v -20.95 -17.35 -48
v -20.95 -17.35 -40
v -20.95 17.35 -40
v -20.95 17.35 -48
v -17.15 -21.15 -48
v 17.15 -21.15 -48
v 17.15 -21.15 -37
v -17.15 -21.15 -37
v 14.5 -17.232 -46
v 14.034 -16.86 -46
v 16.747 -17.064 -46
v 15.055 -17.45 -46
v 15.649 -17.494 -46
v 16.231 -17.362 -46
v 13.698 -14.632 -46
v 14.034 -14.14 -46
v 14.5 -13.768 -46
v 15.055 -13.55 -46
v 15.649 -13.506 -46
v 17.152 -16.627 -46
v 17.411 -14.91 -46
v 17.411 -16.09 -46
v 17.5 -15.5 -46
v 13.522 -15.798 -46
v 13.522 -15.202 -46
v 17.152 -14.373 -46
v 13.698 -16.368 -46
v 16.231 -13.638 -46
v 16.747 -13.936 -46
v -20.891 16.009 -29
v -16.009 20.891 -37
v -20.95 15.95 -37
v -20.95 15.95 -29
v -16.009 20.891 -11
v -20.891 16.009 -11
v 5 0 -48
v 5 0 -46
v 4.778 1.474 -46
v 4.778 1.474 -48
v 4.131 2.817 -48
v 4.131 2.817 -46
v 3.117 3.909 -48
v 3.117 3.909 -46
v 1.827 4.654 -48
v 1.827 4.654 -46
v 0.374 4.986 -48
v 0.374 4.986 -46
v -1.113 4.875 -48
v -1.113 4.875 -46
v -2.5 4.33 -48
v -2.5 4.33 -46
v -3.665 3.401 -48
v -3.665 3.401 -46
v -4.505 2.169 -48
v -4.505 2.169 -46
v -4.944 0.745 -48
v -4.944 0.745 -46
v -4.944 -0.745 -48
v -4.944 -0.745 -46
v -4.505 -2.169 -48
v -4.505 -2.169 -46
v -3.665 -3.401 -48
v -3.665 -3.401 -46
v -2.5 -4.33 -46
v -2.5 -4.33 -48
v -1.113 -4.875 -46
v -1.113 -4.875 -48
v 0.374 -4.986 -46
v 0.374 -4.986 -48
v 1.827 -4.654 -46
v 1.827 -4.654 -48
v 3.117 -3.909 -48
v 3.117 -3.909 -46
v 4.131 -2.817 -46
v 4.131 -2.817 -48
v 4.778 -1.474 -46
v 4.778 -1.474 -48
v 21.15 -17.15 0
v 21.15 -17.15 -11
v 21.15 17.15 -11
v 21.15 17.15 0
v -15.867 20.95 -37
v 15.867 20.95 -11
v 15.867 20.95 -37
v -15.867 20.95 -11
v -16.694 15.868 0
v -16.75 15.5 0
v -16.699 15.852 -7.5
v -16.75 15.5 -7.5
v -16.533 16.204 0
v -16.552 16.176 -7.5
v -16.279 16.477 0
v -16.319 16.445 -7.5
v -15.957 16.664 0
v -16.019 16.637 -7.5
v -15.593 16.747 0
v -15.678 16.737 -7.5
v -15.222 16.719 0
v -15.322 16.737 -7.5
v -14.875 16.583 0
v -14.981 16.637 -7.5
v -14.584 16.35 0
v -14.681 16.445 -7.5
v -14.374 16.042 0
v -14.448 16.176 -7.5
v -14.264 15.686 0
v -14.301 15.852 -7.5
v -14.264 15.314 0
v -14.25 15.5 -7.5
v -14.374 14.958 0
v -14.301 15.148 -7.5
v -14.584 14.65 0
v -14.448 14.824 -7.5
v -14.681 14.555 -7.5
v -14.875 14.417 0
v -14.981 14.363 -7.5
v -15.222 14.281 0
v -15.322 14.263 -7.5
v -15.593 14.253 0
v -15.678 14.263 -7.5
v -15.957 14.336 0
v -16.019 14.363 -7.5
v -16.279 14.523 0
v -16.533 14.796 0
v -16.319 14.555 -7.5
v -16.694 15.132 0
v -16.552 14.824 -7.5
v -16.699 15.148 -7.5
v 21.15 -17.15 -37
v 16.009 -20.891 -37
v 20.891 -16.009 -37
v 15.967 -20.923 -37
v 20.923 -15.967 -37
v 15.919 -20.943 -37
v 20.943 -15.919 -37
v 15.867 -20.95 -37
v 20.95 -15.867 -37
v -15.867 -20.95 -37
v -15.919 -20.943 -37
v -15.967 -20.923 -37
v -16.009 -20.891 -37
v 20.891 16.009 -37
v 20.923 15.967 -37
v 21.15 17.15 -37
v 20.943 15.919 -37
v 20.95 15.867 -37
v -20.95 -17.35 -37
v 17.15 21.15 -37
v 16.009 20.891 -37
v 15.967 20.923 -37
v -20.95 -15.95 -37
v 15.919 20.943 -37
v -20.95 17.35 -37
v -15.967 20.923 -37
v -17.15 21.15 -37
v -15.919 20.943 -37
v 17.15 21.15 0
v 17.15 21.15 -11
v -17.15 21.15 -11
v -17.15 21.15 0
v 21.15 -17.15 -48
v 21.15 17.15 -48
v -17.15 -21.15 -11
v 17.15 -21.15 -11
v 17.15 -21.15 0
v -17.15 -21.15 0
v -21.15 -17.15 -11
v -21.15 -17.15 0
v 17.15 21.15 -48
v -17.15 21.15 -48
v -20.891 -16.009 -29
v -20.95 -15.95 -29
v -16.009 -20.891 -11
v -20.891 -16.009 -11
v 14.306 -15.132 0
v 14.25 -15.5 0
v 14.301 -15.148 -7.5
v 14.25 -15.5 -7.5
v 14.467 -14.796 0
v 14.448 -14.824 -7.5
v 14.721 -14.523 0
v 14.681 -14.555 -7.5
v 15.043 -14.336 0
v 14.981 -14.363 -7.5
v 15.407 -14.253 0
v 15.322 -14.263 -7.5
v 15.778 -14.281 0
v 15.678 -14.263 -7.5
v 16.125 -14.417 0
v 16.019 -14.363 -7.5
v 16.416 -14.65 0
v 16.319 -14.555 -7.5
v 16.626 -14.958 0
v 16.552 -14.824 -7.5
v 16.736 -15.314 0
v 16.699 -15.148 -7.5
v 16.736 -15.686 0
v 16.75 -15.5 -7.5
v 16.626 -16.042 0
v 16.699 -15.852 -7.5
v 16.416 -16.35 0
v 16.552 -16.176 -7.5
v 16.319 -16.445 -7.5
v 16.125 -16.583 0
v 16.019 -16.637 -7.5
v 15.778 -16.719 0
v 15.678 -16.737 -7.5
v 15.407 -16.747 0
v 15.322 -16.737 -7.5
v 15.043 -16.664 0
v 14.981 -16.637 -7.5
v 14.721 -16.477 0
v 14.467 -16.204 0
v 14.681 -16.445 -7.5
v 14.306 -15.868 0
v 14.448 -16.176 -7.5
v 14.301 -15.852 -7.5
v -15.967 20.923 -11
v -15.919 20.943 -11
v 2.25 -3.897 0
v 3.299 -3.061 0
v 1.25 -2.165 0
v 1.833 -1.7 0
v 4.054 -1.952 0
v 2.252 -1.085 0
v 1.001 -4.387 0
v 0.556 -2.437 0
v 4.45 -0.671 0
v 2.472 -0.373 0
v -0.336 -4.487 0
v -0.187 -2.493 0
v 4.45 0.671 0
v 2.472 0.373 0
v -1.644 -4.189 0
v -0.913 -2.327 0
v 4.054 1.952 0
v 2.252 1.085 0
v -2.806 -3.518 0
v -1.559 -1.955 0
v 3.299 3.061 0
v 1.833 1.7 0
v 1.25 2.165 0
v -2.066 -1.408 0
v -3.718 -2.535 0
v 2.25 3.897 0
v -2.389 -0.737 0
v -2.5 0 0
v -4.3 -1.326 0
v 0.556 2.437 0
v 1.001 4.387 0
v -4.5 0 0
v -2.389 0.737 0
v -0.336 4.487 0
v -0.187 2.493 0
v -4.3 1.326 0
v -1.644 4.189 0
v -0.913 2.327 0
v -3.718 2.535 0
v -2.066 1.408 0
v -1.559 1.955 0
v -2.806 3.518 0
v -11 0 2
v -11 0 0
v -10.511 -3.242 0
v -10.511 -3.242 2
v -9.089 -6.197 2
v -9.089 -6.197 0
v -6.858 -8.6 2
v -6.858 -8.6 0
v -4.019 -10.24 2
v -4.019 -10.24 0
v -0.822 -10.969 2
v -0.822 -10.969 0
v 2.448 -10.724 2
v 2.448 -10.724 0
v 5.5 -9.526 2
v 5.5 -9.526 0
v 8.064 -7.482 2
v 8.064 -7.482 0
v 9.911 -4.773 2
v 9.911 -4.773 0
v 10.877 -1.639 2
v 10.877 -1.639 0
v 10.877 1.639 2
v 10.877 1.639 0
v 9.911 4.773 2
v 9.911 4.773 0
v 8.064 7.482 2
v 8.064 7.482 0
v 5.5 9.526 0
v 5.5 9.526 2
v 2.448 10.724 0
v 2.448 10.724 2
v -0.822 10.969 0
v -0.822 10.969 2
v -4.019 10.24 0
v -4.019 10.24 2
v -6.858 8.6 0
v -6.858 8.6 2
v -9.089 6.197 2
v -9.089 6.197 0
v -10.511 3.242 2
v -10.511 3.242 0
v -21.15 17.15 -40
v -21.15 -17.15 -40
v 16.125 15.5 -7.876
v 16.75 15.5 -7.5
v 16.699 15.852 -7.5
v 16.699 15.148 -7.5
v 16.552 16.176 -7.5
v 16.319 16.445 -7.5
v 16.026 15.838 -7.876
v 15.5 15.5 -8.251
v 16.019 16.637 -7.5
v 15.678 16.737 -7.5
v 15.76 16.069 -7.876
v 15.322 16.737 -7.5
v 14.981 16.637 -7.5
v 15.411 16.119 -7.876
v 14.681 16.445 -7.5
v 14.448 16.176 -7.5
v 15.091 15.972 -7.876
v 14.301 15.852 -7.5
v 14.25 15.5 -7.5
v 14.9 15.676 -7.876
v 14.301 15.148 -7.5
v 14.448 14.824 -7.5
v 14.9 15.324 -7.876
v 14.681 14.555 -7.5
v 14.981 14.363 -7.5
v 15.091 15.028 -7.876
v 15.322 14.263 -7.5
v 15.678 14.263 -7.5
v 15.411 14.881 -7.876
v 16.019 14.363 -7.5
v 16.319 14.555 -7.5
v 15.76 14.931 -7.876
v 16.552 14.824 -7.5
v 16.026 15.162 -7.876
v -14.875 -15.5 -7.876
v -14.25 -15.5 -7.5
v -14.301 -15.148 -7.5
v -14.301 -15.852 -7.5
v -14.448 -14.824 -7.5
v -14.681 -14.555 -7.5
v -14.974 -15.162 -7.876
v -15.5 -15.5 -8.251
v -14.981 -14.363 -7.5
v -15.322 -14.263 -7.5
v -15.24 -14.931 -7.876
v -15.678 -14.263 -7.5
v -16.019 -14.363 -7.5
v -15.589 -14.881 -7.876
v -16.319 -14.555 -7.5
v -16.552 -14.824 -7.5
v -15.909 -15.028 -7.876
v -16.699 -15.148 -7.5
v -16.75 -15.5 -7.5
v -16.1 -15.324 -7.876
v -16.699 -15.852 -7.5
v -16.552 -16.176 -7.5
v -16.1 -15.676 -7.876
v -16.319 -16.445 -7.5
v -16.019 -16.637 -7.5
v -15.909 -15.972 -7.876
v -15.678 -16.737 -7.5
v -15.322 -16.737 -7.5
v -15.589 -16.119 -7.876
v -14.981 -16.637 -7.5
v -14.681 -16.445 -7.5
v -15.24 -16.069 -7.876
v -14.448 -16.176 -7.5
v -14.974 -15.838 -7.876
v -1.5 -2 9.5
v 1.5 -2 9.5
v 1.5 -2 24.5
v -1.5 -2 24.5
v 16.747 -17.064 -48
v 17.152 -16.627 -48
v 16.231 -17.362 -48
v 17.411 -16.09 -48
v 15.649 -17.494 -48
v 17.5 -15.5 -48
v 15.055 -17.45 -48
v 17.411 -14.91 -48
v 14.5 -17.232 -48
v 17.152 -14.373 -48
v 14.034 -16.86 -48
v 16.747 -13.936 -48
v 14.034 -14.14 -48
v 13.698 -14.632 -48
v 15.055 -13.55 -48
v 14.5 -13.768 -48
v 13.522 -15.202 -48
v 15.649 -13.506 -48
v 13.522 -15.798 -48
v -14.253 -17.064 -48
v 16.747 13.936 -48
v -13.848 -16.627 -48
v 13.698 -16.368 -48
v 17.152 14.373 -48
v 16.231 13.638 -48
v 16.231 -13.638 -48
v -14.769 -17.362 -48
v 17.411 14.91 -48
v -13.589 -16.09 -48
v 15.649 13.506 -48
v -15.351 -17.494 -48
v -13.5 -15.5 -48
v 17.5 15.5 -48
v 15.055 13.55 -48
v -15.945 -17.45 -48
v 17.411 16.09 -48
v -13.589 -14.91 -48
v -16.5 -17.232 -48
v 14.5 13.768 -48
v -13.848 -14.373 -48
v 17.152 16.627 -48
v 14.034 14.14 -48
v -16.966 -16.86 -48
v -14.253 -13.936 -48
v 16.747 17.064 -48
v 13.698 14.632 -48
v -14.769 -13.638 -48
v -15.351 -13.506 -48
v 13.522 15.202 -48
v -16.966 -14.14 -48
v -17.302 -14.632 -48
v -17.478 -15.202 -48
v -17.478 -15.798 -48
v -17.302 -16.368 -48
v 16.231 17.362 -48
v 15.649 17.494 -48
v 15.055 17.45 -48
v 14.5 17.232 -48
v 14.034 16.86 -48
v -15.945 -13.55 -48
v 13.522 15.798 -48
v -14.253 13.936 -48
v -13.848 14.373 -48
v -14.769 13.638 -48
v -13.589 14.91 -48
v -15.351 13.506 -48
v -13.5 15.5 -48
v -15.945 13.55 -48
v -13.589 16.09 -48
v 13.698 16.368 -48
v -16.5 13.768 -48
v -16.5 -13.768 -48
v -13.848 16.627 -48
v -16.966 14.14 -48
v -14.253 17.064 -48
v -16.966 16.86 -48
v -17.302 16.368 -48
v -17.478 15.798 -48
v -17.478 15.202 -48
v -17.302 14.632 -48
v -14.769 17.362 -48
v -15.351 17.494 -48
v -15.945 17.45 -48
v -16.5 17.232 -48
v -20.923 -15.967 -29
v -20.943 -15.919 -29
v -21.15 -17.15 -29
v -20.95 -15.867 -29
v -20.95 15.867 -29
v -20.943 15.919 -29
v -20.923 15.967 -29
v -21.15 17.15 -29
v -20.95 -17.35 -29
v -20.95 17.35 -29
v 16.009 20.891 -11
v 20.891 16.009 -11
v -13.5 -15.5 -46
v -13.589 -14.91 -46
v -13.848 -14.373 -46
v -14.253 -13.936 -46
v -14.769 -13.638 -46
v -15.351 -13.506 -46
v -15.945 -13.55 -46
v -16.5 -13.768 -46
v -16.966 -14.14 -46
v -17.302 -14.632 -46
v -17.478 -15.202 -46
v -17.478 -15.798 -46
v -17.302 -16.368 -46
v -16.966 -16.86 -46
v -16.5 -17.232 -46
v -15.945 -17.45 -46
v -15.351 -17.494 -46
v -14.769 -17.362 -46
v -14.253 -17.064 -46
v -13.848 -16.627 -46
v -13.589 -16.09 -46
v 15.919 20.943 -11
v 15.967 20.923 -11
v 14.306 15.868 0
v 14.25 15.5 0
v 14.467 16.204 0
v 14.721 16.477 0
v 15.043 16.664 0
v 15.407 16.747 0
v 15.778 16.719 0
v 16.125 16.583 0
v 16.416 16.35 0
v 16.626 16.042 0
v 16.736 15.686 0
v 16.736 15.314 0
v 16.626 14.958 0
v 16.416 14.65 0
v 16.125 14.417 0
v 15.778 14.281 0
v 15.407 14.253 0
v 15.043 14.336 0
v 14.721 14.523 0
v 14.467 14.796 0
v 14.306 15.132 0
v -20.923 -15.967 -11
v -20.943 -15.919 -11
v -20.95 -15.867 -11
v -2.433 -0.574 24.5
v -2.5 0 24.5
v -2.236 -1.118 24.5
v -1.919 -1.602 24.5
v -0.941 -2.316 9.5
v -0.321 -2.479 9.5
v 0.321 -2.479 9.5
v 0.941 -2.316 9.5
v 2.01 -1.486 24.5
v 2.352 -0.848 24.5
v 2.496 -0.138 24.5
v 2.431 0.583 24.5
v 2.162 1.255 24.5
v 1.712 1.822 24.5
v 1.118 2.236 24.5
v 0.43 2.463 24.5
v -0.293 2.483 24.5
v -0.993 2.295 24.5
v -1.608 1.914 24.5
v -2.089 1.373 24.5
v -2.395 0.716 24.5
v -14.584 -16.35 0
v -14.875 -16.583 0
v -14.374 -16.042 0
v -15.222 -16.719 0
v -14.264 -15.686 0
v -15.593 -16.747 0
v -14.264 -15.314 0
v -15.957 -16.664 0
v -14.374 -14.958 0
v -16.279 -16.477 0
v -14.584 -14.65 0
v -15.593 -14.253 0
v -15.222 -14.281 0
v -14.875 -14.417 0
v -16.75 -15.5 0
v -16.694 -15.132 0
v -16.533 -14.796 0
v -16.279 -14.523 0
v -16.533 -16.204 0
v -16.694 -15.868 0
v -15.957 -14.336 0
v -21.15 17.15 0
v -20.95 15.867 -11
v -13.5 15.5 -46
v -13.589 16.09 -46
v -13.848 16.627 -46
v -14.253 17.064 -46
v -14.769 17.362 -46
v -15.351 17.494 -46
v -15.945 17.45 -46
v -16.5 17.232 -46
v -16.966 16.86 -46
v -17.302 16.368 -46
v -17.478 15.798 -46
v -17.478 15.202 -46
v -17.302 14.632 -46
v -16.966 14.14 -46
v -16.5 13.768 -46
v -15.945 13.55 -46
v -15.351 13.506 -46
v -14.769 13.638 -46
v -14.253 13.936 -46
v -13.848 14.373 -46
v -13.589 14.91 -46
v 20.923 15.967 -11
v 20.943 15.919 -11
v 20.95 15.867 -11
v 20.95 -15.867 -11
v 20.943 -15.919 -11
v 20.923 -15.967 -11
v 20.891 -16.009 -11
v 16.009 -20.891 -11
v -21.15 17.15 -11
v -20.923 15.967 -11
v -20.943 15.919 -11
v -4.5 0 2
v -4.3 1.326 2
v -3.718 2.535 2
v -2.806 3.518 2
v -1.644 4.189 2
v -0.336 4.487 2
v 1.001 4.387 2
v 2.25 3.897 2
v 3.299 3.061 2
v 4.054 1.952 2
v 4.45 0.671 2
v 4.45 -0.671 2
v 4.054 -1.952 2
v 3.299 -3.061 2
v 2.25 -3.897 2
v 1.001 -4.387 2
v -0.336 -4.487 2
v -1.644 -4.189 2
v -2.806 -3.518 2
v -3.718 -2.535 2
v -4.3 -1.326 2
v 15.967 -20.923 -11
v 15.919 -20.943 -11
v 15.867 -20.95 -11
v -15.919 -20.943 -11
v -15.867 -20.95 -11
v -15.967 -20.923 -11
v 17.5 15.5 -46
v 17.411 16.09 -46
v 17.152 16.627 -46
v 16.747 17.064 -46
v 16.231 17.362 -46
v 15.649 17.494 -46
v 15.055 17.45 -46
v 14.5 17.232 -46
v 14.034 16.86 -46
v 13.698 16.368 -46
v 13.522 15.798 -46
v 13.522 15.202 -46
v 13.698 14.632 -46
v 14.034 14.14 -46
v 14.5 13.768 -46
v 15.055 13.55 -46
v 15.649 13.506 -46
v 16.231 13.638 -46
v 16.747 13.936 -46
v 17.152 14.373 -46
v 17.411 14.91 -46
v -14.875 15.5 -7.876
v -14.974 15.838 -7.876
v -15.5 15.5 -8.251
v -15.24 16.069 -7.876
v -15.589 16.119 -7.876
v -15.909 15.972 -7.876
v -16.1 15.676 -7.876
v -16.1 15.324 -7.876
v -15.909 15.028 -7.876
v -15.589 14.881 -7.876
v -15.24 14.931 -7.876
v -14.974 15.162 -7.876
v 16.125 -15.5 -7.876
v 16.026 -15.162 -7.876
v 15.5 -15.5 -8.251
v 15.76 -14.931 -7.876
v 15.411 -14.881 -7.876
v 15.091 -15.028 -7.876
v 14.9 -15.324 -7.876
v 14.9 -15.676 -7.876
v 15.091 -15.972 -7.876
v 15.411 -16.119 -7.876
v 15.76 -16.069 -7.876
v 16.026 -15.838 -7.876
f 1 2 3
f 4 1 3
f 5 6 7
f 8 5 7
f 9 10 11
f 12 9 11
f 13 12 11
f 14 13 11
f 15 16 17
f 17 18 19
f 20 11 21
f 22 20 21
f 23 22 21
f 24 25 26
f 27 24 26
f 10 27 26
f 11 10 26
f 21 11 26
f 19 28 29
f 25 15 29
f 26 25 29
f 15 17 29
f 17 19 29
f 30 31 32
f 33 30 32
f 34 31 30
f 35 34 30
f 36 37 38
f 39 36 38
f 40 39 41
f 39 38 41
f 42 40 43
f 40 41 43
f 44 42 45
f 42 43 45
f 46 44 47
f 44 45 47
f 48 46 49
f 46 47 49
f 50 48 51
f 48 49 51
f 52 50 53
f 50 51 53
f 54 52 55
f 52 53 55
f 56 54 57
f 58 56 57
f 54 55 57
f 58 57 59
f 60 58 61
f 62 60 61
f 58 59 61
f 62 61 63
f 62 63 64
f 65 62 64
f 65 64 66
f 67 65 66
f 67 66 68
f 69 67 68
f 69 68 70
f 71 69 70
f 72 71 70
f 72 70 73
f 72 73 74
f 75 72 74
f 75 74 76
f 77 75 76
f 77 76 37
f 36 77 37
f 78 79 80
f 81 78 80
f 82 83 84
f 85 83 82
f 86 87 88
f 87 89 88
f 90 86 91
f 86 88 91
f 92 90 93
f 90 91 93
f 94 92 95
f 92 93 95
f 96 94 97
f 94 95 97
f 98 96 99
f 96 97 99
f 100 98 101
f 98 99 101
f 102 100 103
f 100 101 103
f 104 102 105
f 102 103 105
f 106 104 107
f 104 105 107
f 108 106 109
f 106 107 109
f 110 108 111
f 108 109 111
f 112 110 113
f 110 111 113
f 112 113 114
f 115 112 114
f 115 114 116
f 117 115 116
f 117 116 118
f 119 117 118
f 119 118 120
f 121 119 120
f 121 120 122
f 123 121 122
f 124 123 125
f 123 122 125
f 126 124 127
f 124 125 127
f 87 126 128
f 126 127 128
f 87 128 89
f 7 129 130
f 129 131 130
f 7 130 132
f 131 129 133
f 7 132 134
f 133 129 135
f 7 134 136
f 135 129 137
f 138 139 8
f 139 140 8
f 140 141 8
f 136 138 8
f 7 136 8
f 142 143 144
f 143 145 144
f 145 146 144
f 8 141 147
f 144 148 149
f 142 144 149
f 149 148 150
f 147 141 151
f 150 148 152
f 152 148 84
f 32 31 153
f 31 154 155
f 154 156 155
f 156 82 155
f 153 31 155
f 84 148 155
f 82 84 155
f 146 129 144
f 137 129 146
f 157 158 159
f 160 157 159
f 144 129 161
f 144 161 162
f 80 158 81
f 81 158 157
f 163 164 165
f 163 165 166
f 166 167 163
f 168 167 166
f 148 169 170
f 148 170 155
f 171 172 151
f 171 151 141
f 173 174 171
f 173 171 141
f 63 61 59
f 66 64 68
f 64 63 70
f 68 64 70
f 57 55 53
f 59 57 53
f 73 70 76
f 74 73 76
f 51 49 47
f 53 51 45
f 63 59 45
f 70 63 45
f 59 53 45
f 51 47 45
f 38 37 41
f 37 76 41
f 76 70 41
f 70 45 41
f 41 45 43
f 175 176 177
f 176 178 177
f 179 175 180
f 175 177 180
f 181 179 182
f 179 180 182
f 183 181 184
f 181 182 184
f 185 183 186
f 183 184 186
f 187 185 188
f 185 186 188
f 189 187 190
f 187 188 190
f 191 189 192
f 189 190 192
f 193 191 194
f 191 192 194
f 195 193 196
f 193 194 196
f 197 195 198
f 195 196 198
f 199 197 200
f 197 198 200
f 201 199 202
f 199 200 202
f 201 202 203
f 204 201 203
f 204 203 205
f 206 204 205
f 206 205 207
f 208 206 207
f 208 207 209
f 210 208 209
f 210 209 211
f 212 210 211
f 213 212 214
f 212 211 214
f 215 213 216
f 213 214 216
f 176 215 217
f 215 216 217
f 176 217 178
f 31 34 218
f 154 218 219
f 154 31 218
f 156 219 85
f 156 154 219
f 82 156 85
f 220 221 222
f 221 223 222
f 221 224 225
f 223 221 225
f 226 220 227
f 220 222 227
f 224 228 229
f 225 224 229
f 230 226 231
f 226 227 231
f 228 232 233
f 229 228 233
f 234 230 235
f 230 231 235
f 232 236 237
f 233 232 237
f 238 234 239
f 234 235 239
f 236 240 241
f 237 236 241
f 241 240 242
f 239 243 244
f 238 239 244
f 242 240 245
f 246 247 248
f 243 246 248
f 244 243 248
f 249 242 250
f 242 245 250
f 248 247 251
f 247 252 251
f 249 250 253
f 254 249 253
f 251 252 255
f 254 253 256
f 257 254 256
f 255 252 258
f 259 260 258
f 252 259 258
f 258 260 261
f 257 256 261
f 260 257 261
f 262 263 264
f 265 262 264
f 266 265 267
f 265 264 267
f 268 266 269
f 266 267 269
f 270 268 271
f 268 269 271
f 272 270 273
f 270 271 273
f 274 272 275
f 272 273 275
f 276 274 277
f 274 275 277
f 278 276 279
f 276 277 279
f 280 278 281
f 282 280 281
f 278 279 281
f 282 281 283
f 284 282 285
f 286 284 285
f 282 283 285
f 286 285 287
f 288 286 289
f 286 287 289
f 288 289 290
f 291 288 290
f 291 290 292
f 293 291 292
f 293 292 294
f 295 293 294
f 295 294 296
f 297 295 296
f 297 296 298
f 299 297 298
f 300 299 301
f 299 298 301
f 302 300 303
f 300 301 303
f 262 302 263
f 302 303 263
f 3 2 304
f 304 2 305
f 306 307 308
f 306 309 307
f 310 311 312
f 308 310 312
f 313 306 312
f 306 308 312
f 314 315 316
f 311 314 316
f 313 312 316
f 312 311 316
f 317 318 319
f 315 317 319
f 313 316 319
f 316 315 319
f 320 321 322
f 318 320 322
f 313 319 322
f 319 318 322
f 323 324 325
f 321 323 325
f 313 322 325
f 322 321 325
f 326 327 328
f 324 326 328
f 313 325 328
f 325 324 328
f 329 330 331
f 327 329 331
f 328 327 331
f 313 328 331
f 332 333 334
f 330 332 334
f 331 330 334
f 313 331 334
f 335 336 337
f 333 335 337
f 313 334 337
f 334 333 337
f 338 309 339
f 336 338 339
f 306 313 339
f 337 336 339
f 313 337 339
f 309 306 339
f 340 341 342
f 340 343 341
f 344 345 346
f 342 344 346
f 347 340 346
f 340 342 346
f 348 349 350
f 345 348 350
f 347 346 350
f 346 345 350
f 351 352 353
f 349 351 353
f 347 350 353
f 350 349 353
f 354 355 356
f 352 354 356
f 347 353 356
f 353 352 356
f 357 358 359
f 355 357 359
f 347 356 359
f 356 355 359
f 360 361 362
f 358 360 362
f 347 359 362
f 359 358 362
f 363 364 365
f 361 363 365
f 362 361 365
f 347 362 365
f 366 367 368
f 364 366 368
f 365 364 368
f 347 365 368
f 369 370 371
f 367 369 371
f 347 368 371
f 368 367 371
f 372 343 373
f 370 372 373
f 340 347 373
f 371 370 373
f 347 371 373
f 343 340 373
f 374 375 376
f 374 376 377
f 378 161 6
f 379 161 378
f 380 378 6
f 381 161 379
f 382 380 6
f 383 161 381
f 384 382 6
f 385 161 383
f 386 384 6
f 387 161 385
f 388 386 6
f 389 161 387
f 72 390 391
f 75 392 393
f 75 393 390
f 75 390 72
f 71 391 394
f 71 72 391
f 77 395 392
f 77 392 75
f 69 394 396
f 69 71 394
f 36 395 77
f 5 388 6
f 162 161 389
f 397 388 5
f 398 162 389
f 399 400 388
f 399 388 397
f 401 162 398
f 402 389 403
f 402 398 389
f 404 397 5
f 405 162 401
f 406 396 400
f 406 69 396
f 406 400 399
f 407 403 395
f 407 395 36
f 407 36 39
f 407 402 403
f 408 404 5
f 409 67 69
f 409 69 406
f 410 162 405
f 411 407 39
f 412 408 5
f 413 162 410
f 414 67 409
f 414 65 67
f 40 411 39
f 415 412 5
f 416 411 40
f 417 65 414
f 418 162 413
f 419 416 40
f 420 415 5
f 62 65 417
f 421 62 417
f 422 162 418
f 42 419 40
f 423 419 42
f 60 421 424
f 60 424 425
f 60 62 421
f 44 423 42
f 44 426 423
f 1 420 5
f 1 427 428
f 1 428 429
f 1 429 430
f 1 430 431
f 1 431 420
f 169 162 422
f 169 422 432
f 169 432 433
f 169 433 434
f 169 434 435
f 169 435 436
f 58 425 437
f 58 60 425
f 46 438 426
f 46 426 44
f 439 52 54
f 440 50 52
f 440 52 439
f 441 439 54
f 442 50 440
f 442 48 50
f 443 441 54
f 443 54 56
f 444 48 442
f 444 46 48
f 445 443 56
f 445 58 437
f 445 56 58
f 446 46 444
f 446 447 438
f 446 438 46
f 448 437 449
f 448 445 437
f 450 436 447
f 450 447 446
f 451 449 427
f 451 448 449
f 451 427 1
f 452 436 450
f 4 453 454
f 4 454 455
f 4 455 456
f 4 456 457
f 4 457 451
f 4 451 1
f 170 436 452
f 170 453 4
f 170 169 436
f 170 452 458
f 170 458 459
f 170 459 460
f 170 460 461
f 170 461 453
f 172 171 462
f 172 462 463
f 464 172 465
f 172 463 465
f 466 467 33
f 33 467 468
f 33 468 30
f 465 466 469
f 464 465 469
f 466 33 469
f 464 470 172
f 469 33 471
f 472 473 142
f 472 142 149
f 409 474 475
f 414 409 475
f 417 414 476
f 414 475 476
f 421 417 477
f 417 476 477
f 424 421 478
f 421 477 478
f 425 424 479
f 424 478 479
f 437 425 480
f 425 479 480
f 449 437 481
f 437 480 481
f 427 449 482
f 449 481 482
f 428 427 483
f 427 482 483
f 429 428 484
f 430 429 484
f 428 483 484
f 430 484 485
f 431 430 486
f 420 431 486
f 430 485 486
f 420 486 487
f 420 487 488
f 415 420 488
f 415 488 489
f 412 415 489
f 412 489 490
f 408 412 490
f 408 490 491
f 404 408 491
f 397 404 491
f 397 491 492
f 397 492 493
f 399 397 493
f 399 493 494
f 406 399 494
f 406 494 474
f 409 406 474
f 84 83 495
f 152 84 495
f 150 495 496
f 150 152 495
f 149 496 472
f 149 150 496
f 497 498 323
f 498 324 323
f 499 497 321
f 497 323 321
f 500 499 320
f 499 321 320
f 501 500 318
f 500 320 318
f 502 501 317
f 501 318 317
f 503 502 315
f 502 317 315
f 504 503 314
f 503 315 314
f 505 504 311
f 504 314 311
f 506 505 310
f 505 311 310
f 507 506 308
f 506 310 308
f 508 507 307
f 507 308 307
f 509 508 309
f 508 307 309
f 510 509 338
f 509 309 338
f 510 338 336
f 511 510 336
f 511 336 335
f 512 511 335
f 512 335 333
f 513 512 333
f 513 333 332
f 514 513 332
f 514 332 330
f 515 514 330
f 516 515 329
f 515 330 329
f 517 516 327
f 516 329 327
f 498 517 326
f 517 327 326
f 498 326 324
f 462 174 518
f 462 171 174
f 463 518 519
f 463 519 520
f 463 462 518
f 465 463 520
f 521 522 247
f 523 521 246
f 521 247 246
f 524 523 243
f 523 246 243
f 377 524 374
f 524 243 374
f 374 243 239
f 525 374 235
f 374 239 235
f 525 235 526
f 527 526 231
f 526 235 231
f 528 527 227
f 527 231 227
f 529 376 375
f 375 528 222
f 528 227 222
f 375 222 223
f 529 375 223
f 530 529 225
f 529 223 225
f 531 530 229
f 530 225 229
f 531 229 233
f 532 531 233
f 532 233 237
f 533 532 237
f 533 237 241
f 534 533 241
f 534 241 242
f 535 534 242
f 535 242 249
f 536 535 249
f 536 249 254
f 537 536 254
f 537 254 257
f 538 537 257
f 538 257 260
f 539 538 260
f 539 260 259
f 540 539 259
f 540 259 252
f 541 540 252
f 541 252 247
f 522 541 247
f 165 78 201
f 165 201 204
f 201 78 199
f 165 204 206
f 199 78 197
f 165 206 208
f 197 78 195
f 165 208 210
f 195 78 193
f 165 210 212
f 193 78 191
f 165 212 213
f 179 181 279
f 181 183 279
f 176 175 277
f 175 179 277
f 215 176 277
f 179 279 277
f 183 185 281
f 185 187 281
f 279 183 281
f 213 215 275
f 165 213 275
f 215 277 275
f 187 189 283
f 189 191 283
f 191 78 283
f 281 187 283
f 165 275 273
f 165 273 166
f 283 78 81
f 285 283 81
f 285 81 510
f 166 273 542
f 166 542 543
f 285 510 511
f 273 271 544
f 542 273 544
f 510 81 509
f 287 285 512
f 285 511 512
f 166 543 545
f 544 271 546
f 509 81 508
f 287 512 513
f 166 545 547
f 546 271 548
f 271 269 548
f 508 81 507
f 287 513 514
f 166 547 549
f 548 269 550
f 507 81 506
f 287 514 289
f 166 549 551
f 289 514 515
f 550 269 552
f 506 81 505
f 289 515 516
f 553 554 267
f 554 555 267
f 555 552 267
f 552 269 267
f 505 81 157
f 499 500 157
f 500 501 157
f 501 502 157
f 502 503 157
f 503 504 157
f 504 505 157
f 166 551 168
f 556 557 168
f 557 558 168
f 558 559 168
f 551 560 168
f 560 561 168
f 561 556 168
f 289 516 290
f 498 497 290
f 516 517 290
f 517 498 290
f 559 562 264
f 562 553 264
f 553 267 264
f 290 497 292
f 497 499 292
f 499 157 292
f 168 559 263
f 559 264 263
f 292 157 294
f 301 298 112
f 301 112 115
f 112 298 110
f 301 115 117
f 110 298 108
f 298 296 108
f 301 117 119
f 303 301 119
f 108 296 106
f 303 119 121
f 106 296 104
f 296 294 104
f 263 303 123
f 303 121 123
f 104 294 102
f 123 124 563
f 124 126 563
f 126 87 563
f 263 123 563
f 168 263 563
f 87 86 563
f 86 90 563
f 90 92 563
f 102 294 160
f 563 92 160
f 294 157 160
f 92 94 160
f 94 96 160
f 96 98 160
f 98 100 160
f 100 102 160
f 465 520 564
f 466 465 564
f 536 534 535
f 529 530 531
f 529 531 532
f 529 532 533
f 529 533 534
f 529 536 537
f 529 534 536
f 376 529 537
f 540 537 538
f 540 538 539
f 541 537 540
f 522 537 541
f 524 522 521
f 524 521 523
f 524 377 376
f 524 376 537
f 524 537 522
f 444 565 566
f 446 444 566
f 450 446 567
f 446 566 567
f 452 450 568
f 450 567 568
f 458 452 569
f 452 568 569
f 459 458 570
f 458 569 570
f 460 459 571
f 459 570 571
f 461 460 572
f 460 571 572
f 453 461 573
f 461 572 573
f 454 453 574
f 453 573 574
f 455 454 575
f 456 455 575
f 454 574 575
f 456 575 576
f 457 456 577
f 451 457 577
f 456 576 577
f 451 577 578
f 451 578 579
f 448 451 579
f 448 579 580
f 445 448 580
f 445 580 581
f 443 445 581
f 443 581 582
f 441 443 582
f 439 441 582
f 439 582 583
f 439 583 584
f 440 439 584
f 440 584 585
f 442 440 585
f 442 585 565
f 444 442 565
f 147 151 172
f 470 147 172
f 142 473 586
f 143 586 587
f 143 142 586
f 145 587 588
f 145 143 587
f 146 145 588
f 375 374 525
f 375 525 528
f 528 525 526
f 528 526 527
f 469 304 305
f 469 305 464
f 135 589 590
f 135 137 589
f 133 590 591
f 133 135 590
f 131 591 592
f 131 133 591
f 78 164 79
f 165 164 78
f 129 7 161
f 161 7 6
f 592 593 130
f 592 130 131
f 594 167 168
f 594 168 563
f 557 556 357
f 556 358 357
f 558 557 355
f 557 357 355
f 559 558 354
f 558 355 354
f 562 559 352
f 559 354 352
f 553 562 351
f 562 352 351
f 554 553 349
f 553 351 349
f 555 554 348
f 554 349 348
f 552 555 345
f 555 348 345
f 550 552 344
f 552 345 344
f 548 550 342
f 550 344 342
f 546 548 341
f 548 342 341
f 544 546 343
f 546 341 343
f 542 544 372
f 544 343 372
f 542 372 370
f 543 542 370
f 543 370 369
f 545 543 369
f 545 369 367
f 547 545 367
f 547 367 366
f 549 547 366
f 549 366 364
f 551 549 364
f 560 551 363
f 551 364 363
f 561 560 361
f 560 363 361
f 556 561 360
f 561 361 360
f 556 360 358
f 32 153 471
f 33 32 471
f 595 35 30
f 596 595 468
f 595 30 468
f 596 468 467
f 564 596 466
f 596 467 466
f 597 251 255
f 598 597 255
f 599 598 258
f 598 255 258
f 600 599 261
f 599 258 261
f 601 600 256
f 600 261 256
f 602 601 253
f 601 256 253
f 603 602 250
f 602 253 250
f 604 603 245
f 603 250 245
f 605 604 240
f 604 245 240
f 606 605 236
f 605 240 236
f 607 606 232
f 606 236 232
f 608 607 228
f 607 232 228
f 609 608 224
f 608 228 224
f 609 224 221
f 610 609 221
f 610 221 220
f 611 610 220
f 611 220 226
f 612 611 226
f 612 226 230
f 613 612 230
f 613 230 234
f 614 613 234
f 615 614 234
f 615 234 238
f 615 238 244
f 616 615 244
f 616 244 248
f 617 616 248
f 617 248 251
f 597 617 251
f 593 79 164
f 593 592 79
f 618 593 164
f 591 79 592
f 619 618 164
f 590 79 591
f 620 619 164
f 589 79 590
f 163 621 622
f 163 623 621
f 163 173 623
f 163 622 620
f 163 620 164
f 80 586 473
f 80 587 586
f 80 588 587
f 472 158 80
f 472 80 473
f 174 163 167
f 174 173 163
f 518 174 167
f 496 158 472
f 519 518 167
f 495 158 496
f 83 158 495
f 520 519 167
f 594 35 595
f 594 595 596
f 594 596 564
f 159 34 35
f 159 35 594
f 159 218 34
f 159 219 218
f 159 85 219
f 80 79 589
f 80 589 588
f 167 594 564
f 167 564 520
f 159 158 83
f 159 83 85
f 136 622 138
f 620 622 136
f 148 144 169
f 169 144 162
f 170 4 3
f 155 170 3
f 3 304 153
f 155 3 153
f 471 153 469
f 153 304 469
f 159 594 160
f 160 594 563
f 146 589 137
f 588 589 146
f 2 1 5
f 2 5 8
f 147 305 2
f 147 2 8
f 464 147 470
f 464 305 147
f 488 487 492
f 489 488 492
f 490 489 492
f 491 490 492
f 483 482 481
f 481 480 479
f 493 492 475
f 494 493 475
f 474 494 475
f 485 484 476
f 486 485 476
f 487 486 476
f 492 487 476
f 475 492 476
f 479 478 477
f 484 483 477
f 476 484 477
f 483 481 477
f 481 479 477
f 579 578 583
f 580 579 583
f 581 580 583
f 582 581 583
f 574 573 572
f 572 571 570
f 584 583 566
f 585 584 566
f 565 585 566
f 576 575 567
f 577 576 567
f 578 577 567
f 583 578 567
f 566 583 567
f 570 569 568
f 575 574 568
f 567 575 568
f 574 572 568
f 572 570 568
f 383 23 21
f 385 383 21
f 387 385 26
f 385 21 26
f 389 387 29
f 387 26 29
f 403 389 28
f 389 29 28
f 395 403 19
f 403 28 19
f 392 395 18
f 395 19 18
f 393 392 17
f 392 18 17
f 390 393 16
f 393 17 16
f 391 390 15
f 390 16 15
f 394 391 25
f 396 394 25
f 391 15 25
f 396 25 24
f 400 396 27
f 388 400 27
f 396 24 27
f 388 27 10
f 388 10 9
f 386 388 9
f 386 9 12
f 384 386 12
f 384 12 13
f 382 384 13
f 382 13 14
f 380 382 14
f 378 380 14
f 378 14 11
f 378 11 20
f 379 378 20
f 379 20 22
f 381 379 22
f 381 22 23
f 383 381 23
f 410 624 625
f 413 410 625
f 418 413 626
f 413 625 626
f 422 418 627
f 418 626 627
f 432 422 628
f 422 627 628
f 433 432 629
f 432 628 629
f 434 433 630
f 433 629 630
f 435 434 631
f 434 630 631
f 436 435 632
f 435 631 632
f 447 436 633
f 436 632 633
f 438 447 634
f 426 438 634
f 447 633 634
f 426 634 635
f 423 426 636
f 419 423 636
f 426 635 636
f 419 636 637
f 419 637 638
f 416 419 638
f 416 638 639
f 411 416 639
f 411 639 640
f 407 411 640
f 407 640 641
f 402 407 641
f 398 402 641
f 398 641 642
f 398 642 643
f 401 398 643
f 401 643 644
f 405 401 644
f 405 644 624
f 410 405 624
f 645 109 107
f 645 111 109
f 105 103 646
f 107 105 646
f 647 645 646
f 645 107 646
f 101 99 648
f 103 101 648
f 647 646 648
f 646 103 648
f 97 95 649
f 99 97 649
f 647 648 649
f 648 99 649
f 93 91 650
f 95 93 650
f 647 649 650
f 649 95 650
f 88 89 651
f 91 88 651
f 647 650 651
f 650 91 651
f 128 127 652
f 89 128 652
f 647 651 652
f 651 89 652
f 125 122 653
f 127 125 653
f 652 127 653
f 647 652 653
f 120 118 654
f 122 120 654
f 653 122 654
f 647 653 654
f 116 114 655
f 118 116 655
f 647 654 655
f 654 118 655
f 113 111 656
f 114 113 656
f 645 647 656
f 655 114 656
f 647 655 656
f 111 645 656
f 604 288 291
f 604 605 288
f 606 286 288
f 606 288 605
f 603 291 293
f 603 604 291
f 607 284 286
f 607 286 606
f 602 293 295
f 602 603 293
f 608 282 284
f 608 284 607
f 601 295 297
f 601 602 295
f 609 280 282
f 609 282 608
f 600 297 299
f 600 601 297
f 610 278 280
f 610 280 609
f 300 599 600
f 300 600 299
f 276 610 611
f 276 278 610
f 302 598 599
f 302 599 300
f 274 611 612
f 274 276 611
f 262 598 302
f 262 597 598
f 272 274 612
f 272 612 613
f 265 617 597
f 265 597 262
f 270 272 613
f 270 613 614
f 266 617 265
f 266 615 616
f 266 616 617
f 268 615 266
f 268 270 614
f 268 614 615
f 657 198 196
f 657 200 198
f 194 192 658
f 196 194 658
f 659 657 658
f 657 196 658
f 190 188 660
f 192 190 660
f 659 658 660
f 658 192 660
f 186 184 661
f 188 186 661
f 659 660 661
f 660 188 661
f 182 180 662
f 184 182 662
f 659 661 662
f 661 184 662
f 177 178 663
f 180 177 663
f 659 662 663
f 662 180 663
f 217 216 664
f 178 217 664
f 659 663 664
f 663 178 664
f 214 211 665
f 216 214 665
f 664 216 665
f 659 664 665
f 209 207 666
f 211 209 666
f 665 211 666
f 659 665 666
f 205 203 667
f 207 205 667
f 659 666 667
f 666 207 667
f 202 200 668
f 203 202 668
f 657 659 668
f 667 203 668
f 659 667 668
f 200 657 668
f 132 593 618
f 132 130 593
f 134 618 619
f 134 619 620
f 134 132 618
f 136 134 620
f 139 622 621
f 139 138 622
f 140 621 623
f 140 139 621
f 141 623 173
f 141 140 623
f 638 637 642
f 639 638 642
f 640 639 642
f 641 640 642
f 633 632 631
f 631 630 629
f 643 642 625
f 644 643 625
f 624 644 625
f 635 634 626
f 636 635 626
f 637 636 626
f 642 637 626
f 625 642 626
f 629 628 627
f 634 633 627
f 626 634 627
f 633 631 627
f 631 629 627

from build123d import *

# Parameters (mm, degrees)
BOSS_EXTRU_1_DEPTH                  = 26
ESQUISSE2_W                         = 42.1
ESQUISSE2_H                         = 42.3
BOSS_EXTRU_2_DEPTH                  = 11
ESQUISSE3_W                         = 11
ESQUISSE3_H                         = 42.3
BOSS_EXTRU_3_DEPTH                  = 0.2
ESQUISSE4_W                         = 42.3
ESQUISSE4_H                         = 42.3
BOSS_EXTRU_4_DEPTH                  = 11
ESQUISSE5_R                         = 11
BOSS_EXTRU_5_DEPTH                  = 2
DIAM_TRE_DU_PER_AGE_9_0_9_1_D       = 9
DIAM_TRE_DU_PER_AGE_9_0_9_1_DEPTH   = 2
ESQUISSE8_R                         = 2.5
BOSS_EXTRU_6_DEPTH                  = 24.5
ENL_V_START                         = -15
ENL_V_MAT_EXTRU_1_DEPTH             = 15
DIAM_TRE_DU_PER_AGE_2_5_2_5_1_D     = 2.5
DIAM_TRE_DU_PER_AGE_2_5_2_5_1_DEPTH = 7.5
DIAM_TRE_DU_PER_AGE_2_5_2_5_1_TIP   = 0.751075774
DIAM_TRE_DU_PER_AGE_4_0_4_1_D       = 4
DIAM_TRE_DU_PER_AGE_4_0_4_1_DEPTH   = 2
DIAM_TRE_DU_PER_AGE_10_0_10_1_D     = 10
DIAM_TRE_DU_PER_AGE_10_0_10_1_DEPTH = 2
CHANFREIN1_SIZE                     = 4
CONG_1_R                            = 0.2


with BuildPart() as part:
    # Esquisse1 → Boss.-Extru.1 (new body)
    with BuildSketch(Plane.XY.offset(-11)):
        Polygon((20.95, 15.95), (15.95, 20.95), (-15.95, 20.95), (-20.95, 15.95), (-20.95, -15.95), (-15.95, -20.95), (15.95, -20.95), (20.95, -15.95), align=None)
    extrude(amount=-BOSS_EXTRU_1_DEPTH)

    # Esquisse2 → Boss.-Extru.2 (add)
    with BuildSketch(Plane(origin=(0, 0, -37), x_dir=(-1, 0, 0), z_dir=(0, 0, -1))):
        with Locations((-0.1, 0)):
            Rectangle(ESQUISSE2_W, ESQUISSE2_H)
    extrude(amount=BOSS_EXTRU_2_DEPTH)

    # Esquisse3 → Boss.-Extru.3 (add)
    with BuildSketch(Plane.ZY.offset(20.95)):
        with Locations((-34.5, 0)):
            Rectangle(ESQUISSE3_W, ESQUISSE3_H)
    extrude(amount=BOSS_EXTRU_3_DEPTH)

    # Esquisse4 → Boss.-Extru.4 (add)
    with BuildSketch(Plane(origin=(0, 0, -11), x_dir=(-1, 0, 0), z_dir=(0, 0, -1))):
        Rectangle(ESQUISSE4_W, ESQUISSE4_H)
    extrude(amount=-BOSS_EXTRU_4_DEPTH)

    # Esquisse5 → Boss.-Extru.5 (add)
    with BuildSketch(Plane.XY):
        with Locations(Location((0, 0, 0), (0, 0, 180))):
            Circle(ESQUISSE5_R)
    extrude(amount=BOSS_EXTRU_5_DEPTH)

    # Diamètre du perçage Ø9.0 (9)1
    with Locations(Plane.XY.offset(2)):
        with Locations((0, 0)):
            Hole(DIAM_TRE_DU_PER_AGE_9_0_9_1_D / 2, depth=DIAM_TRE_DU_PER_AGE_9_0_9_1_DEPTH)

    # Esquisse8 → Boss.-Extru.6 (add)
    with BuildSketch(Plane.XY):
        with Locations(Location((0, 0, 0), (0, 0, 180))):
            Circle(ESQUISSE8_R)
    extrude(amount=BOSS_EXTRU_6_DEPTH)

    # Esquisse9 → Enlèv. mat.-Extru.1 (cut)
    with BuildSketch(Plane.XY.offset(24.5).offset(ENL_V_START)):
        with BuildLine():
            Line((1.5, -2), (-1.5, -2))
            ThreePointArc((-1.5, -2), (0, -2.5), (1.5, -2))
        make_face()
    extrude(amount=ENL_V_MAT_EXTRU_1_DEPTH, mode=Mode.SUBTRACT)

    # Diamètre du perçage Ø2.5 (2.5)1
    with Locations(Plane.XY):
        with Locations((-15.5, 15.5), (-15.5, -15.5), (15.5, -15.5), (15.5, 15.5)):
            Hole(DIAM_TRE_DU_PER_AGE_2_5_2_5_1_D / 2, depth=DIAM_TRE_DU_PER_AGE_2_5_2_5_1_DEPTH)
            with Locations((0, 0, -(DIAM_TRE_DU_PER_AGE_2_5_2_5_1_DEPTH + DIAM_TRE_DU_PER_AGE_2_5_2_5_1_TIP / 2))):  # 118° drill point
                Cone(0, DIAM_TRE_DU_PER_AGE_2_5_2_5_1_D / 2, DIAM_TRE_DU_PER_AGE_2_5_2_5_1_TIP, mode=Mode.SUBTRACT)

    # Diamètre du perçage Ø4.0 (4)1
    with Locations(Plane(origin=(0, 0, -48), x_dir=(-1, 0, 0), z_dir=(0, 0, -1))):
        with Locations((-15.5, -15.5), (-15.5, 15.5), (15.5, 15.5), (15.5, -15.5)):
            Hole(DIAM_TRE_DU_PER_AGE_4_0_4_1_D / 2, depth=DIAM_TRE_DU_PER_AGE_4_0_4_1_DEPTH)

    # Diamètre du perçage Ø10.0 (10)1
    with Locations(Plane(origin=(0, 0, -48), x_dir=(-1, 0, 0), z_dir=(0, 0, -1))):
        with Locations((0, 0)):
            Hole(DIAM_TRE_DU_PER_AGE_10_0_10_1_D / 2, depth=DIAM_TRE_DU_PER_AGE_10_0_10_1_DEPTH)

    # Chanfrein1
    chanfrein1_edges = [part.edges().sort_by_distance(p)[0] for p in [
        (21.15, 21.15, -42.5),
        (-21.15, -21.15, -34.5),
        (21.15, -21.15, -42.5),
        (-21.15, 21.15, -5.5),
        (-21.15, -21.15, -5.5),
        (21.15, -21.15, -5.5),
        (-21.15, 21.15, -34.5),
        (21.15, 21.15, -5.5),
    ]]
    chamfer(chanfrein1_edges, length=CHANFREIN1_SIZE)

    # Congé1
    cong_1_edges = [part.edges().sort_by_distance(p)[0] for p in [
        (20.95, -15.95, -24),
        (15.95, -20.95, -24),
        (-15.95, -20.95, -24),
        (-15.95, 20.95, -24),
        (15.95, 20.95, -24),
        (20.95, 15.95, -24),
        (-20.95, 15.95, -20),
        (-20.95, -15.95, -20),
    ]]
    fillet(cong_1_edges, radius=CONG_1_R)


solid = part.part
